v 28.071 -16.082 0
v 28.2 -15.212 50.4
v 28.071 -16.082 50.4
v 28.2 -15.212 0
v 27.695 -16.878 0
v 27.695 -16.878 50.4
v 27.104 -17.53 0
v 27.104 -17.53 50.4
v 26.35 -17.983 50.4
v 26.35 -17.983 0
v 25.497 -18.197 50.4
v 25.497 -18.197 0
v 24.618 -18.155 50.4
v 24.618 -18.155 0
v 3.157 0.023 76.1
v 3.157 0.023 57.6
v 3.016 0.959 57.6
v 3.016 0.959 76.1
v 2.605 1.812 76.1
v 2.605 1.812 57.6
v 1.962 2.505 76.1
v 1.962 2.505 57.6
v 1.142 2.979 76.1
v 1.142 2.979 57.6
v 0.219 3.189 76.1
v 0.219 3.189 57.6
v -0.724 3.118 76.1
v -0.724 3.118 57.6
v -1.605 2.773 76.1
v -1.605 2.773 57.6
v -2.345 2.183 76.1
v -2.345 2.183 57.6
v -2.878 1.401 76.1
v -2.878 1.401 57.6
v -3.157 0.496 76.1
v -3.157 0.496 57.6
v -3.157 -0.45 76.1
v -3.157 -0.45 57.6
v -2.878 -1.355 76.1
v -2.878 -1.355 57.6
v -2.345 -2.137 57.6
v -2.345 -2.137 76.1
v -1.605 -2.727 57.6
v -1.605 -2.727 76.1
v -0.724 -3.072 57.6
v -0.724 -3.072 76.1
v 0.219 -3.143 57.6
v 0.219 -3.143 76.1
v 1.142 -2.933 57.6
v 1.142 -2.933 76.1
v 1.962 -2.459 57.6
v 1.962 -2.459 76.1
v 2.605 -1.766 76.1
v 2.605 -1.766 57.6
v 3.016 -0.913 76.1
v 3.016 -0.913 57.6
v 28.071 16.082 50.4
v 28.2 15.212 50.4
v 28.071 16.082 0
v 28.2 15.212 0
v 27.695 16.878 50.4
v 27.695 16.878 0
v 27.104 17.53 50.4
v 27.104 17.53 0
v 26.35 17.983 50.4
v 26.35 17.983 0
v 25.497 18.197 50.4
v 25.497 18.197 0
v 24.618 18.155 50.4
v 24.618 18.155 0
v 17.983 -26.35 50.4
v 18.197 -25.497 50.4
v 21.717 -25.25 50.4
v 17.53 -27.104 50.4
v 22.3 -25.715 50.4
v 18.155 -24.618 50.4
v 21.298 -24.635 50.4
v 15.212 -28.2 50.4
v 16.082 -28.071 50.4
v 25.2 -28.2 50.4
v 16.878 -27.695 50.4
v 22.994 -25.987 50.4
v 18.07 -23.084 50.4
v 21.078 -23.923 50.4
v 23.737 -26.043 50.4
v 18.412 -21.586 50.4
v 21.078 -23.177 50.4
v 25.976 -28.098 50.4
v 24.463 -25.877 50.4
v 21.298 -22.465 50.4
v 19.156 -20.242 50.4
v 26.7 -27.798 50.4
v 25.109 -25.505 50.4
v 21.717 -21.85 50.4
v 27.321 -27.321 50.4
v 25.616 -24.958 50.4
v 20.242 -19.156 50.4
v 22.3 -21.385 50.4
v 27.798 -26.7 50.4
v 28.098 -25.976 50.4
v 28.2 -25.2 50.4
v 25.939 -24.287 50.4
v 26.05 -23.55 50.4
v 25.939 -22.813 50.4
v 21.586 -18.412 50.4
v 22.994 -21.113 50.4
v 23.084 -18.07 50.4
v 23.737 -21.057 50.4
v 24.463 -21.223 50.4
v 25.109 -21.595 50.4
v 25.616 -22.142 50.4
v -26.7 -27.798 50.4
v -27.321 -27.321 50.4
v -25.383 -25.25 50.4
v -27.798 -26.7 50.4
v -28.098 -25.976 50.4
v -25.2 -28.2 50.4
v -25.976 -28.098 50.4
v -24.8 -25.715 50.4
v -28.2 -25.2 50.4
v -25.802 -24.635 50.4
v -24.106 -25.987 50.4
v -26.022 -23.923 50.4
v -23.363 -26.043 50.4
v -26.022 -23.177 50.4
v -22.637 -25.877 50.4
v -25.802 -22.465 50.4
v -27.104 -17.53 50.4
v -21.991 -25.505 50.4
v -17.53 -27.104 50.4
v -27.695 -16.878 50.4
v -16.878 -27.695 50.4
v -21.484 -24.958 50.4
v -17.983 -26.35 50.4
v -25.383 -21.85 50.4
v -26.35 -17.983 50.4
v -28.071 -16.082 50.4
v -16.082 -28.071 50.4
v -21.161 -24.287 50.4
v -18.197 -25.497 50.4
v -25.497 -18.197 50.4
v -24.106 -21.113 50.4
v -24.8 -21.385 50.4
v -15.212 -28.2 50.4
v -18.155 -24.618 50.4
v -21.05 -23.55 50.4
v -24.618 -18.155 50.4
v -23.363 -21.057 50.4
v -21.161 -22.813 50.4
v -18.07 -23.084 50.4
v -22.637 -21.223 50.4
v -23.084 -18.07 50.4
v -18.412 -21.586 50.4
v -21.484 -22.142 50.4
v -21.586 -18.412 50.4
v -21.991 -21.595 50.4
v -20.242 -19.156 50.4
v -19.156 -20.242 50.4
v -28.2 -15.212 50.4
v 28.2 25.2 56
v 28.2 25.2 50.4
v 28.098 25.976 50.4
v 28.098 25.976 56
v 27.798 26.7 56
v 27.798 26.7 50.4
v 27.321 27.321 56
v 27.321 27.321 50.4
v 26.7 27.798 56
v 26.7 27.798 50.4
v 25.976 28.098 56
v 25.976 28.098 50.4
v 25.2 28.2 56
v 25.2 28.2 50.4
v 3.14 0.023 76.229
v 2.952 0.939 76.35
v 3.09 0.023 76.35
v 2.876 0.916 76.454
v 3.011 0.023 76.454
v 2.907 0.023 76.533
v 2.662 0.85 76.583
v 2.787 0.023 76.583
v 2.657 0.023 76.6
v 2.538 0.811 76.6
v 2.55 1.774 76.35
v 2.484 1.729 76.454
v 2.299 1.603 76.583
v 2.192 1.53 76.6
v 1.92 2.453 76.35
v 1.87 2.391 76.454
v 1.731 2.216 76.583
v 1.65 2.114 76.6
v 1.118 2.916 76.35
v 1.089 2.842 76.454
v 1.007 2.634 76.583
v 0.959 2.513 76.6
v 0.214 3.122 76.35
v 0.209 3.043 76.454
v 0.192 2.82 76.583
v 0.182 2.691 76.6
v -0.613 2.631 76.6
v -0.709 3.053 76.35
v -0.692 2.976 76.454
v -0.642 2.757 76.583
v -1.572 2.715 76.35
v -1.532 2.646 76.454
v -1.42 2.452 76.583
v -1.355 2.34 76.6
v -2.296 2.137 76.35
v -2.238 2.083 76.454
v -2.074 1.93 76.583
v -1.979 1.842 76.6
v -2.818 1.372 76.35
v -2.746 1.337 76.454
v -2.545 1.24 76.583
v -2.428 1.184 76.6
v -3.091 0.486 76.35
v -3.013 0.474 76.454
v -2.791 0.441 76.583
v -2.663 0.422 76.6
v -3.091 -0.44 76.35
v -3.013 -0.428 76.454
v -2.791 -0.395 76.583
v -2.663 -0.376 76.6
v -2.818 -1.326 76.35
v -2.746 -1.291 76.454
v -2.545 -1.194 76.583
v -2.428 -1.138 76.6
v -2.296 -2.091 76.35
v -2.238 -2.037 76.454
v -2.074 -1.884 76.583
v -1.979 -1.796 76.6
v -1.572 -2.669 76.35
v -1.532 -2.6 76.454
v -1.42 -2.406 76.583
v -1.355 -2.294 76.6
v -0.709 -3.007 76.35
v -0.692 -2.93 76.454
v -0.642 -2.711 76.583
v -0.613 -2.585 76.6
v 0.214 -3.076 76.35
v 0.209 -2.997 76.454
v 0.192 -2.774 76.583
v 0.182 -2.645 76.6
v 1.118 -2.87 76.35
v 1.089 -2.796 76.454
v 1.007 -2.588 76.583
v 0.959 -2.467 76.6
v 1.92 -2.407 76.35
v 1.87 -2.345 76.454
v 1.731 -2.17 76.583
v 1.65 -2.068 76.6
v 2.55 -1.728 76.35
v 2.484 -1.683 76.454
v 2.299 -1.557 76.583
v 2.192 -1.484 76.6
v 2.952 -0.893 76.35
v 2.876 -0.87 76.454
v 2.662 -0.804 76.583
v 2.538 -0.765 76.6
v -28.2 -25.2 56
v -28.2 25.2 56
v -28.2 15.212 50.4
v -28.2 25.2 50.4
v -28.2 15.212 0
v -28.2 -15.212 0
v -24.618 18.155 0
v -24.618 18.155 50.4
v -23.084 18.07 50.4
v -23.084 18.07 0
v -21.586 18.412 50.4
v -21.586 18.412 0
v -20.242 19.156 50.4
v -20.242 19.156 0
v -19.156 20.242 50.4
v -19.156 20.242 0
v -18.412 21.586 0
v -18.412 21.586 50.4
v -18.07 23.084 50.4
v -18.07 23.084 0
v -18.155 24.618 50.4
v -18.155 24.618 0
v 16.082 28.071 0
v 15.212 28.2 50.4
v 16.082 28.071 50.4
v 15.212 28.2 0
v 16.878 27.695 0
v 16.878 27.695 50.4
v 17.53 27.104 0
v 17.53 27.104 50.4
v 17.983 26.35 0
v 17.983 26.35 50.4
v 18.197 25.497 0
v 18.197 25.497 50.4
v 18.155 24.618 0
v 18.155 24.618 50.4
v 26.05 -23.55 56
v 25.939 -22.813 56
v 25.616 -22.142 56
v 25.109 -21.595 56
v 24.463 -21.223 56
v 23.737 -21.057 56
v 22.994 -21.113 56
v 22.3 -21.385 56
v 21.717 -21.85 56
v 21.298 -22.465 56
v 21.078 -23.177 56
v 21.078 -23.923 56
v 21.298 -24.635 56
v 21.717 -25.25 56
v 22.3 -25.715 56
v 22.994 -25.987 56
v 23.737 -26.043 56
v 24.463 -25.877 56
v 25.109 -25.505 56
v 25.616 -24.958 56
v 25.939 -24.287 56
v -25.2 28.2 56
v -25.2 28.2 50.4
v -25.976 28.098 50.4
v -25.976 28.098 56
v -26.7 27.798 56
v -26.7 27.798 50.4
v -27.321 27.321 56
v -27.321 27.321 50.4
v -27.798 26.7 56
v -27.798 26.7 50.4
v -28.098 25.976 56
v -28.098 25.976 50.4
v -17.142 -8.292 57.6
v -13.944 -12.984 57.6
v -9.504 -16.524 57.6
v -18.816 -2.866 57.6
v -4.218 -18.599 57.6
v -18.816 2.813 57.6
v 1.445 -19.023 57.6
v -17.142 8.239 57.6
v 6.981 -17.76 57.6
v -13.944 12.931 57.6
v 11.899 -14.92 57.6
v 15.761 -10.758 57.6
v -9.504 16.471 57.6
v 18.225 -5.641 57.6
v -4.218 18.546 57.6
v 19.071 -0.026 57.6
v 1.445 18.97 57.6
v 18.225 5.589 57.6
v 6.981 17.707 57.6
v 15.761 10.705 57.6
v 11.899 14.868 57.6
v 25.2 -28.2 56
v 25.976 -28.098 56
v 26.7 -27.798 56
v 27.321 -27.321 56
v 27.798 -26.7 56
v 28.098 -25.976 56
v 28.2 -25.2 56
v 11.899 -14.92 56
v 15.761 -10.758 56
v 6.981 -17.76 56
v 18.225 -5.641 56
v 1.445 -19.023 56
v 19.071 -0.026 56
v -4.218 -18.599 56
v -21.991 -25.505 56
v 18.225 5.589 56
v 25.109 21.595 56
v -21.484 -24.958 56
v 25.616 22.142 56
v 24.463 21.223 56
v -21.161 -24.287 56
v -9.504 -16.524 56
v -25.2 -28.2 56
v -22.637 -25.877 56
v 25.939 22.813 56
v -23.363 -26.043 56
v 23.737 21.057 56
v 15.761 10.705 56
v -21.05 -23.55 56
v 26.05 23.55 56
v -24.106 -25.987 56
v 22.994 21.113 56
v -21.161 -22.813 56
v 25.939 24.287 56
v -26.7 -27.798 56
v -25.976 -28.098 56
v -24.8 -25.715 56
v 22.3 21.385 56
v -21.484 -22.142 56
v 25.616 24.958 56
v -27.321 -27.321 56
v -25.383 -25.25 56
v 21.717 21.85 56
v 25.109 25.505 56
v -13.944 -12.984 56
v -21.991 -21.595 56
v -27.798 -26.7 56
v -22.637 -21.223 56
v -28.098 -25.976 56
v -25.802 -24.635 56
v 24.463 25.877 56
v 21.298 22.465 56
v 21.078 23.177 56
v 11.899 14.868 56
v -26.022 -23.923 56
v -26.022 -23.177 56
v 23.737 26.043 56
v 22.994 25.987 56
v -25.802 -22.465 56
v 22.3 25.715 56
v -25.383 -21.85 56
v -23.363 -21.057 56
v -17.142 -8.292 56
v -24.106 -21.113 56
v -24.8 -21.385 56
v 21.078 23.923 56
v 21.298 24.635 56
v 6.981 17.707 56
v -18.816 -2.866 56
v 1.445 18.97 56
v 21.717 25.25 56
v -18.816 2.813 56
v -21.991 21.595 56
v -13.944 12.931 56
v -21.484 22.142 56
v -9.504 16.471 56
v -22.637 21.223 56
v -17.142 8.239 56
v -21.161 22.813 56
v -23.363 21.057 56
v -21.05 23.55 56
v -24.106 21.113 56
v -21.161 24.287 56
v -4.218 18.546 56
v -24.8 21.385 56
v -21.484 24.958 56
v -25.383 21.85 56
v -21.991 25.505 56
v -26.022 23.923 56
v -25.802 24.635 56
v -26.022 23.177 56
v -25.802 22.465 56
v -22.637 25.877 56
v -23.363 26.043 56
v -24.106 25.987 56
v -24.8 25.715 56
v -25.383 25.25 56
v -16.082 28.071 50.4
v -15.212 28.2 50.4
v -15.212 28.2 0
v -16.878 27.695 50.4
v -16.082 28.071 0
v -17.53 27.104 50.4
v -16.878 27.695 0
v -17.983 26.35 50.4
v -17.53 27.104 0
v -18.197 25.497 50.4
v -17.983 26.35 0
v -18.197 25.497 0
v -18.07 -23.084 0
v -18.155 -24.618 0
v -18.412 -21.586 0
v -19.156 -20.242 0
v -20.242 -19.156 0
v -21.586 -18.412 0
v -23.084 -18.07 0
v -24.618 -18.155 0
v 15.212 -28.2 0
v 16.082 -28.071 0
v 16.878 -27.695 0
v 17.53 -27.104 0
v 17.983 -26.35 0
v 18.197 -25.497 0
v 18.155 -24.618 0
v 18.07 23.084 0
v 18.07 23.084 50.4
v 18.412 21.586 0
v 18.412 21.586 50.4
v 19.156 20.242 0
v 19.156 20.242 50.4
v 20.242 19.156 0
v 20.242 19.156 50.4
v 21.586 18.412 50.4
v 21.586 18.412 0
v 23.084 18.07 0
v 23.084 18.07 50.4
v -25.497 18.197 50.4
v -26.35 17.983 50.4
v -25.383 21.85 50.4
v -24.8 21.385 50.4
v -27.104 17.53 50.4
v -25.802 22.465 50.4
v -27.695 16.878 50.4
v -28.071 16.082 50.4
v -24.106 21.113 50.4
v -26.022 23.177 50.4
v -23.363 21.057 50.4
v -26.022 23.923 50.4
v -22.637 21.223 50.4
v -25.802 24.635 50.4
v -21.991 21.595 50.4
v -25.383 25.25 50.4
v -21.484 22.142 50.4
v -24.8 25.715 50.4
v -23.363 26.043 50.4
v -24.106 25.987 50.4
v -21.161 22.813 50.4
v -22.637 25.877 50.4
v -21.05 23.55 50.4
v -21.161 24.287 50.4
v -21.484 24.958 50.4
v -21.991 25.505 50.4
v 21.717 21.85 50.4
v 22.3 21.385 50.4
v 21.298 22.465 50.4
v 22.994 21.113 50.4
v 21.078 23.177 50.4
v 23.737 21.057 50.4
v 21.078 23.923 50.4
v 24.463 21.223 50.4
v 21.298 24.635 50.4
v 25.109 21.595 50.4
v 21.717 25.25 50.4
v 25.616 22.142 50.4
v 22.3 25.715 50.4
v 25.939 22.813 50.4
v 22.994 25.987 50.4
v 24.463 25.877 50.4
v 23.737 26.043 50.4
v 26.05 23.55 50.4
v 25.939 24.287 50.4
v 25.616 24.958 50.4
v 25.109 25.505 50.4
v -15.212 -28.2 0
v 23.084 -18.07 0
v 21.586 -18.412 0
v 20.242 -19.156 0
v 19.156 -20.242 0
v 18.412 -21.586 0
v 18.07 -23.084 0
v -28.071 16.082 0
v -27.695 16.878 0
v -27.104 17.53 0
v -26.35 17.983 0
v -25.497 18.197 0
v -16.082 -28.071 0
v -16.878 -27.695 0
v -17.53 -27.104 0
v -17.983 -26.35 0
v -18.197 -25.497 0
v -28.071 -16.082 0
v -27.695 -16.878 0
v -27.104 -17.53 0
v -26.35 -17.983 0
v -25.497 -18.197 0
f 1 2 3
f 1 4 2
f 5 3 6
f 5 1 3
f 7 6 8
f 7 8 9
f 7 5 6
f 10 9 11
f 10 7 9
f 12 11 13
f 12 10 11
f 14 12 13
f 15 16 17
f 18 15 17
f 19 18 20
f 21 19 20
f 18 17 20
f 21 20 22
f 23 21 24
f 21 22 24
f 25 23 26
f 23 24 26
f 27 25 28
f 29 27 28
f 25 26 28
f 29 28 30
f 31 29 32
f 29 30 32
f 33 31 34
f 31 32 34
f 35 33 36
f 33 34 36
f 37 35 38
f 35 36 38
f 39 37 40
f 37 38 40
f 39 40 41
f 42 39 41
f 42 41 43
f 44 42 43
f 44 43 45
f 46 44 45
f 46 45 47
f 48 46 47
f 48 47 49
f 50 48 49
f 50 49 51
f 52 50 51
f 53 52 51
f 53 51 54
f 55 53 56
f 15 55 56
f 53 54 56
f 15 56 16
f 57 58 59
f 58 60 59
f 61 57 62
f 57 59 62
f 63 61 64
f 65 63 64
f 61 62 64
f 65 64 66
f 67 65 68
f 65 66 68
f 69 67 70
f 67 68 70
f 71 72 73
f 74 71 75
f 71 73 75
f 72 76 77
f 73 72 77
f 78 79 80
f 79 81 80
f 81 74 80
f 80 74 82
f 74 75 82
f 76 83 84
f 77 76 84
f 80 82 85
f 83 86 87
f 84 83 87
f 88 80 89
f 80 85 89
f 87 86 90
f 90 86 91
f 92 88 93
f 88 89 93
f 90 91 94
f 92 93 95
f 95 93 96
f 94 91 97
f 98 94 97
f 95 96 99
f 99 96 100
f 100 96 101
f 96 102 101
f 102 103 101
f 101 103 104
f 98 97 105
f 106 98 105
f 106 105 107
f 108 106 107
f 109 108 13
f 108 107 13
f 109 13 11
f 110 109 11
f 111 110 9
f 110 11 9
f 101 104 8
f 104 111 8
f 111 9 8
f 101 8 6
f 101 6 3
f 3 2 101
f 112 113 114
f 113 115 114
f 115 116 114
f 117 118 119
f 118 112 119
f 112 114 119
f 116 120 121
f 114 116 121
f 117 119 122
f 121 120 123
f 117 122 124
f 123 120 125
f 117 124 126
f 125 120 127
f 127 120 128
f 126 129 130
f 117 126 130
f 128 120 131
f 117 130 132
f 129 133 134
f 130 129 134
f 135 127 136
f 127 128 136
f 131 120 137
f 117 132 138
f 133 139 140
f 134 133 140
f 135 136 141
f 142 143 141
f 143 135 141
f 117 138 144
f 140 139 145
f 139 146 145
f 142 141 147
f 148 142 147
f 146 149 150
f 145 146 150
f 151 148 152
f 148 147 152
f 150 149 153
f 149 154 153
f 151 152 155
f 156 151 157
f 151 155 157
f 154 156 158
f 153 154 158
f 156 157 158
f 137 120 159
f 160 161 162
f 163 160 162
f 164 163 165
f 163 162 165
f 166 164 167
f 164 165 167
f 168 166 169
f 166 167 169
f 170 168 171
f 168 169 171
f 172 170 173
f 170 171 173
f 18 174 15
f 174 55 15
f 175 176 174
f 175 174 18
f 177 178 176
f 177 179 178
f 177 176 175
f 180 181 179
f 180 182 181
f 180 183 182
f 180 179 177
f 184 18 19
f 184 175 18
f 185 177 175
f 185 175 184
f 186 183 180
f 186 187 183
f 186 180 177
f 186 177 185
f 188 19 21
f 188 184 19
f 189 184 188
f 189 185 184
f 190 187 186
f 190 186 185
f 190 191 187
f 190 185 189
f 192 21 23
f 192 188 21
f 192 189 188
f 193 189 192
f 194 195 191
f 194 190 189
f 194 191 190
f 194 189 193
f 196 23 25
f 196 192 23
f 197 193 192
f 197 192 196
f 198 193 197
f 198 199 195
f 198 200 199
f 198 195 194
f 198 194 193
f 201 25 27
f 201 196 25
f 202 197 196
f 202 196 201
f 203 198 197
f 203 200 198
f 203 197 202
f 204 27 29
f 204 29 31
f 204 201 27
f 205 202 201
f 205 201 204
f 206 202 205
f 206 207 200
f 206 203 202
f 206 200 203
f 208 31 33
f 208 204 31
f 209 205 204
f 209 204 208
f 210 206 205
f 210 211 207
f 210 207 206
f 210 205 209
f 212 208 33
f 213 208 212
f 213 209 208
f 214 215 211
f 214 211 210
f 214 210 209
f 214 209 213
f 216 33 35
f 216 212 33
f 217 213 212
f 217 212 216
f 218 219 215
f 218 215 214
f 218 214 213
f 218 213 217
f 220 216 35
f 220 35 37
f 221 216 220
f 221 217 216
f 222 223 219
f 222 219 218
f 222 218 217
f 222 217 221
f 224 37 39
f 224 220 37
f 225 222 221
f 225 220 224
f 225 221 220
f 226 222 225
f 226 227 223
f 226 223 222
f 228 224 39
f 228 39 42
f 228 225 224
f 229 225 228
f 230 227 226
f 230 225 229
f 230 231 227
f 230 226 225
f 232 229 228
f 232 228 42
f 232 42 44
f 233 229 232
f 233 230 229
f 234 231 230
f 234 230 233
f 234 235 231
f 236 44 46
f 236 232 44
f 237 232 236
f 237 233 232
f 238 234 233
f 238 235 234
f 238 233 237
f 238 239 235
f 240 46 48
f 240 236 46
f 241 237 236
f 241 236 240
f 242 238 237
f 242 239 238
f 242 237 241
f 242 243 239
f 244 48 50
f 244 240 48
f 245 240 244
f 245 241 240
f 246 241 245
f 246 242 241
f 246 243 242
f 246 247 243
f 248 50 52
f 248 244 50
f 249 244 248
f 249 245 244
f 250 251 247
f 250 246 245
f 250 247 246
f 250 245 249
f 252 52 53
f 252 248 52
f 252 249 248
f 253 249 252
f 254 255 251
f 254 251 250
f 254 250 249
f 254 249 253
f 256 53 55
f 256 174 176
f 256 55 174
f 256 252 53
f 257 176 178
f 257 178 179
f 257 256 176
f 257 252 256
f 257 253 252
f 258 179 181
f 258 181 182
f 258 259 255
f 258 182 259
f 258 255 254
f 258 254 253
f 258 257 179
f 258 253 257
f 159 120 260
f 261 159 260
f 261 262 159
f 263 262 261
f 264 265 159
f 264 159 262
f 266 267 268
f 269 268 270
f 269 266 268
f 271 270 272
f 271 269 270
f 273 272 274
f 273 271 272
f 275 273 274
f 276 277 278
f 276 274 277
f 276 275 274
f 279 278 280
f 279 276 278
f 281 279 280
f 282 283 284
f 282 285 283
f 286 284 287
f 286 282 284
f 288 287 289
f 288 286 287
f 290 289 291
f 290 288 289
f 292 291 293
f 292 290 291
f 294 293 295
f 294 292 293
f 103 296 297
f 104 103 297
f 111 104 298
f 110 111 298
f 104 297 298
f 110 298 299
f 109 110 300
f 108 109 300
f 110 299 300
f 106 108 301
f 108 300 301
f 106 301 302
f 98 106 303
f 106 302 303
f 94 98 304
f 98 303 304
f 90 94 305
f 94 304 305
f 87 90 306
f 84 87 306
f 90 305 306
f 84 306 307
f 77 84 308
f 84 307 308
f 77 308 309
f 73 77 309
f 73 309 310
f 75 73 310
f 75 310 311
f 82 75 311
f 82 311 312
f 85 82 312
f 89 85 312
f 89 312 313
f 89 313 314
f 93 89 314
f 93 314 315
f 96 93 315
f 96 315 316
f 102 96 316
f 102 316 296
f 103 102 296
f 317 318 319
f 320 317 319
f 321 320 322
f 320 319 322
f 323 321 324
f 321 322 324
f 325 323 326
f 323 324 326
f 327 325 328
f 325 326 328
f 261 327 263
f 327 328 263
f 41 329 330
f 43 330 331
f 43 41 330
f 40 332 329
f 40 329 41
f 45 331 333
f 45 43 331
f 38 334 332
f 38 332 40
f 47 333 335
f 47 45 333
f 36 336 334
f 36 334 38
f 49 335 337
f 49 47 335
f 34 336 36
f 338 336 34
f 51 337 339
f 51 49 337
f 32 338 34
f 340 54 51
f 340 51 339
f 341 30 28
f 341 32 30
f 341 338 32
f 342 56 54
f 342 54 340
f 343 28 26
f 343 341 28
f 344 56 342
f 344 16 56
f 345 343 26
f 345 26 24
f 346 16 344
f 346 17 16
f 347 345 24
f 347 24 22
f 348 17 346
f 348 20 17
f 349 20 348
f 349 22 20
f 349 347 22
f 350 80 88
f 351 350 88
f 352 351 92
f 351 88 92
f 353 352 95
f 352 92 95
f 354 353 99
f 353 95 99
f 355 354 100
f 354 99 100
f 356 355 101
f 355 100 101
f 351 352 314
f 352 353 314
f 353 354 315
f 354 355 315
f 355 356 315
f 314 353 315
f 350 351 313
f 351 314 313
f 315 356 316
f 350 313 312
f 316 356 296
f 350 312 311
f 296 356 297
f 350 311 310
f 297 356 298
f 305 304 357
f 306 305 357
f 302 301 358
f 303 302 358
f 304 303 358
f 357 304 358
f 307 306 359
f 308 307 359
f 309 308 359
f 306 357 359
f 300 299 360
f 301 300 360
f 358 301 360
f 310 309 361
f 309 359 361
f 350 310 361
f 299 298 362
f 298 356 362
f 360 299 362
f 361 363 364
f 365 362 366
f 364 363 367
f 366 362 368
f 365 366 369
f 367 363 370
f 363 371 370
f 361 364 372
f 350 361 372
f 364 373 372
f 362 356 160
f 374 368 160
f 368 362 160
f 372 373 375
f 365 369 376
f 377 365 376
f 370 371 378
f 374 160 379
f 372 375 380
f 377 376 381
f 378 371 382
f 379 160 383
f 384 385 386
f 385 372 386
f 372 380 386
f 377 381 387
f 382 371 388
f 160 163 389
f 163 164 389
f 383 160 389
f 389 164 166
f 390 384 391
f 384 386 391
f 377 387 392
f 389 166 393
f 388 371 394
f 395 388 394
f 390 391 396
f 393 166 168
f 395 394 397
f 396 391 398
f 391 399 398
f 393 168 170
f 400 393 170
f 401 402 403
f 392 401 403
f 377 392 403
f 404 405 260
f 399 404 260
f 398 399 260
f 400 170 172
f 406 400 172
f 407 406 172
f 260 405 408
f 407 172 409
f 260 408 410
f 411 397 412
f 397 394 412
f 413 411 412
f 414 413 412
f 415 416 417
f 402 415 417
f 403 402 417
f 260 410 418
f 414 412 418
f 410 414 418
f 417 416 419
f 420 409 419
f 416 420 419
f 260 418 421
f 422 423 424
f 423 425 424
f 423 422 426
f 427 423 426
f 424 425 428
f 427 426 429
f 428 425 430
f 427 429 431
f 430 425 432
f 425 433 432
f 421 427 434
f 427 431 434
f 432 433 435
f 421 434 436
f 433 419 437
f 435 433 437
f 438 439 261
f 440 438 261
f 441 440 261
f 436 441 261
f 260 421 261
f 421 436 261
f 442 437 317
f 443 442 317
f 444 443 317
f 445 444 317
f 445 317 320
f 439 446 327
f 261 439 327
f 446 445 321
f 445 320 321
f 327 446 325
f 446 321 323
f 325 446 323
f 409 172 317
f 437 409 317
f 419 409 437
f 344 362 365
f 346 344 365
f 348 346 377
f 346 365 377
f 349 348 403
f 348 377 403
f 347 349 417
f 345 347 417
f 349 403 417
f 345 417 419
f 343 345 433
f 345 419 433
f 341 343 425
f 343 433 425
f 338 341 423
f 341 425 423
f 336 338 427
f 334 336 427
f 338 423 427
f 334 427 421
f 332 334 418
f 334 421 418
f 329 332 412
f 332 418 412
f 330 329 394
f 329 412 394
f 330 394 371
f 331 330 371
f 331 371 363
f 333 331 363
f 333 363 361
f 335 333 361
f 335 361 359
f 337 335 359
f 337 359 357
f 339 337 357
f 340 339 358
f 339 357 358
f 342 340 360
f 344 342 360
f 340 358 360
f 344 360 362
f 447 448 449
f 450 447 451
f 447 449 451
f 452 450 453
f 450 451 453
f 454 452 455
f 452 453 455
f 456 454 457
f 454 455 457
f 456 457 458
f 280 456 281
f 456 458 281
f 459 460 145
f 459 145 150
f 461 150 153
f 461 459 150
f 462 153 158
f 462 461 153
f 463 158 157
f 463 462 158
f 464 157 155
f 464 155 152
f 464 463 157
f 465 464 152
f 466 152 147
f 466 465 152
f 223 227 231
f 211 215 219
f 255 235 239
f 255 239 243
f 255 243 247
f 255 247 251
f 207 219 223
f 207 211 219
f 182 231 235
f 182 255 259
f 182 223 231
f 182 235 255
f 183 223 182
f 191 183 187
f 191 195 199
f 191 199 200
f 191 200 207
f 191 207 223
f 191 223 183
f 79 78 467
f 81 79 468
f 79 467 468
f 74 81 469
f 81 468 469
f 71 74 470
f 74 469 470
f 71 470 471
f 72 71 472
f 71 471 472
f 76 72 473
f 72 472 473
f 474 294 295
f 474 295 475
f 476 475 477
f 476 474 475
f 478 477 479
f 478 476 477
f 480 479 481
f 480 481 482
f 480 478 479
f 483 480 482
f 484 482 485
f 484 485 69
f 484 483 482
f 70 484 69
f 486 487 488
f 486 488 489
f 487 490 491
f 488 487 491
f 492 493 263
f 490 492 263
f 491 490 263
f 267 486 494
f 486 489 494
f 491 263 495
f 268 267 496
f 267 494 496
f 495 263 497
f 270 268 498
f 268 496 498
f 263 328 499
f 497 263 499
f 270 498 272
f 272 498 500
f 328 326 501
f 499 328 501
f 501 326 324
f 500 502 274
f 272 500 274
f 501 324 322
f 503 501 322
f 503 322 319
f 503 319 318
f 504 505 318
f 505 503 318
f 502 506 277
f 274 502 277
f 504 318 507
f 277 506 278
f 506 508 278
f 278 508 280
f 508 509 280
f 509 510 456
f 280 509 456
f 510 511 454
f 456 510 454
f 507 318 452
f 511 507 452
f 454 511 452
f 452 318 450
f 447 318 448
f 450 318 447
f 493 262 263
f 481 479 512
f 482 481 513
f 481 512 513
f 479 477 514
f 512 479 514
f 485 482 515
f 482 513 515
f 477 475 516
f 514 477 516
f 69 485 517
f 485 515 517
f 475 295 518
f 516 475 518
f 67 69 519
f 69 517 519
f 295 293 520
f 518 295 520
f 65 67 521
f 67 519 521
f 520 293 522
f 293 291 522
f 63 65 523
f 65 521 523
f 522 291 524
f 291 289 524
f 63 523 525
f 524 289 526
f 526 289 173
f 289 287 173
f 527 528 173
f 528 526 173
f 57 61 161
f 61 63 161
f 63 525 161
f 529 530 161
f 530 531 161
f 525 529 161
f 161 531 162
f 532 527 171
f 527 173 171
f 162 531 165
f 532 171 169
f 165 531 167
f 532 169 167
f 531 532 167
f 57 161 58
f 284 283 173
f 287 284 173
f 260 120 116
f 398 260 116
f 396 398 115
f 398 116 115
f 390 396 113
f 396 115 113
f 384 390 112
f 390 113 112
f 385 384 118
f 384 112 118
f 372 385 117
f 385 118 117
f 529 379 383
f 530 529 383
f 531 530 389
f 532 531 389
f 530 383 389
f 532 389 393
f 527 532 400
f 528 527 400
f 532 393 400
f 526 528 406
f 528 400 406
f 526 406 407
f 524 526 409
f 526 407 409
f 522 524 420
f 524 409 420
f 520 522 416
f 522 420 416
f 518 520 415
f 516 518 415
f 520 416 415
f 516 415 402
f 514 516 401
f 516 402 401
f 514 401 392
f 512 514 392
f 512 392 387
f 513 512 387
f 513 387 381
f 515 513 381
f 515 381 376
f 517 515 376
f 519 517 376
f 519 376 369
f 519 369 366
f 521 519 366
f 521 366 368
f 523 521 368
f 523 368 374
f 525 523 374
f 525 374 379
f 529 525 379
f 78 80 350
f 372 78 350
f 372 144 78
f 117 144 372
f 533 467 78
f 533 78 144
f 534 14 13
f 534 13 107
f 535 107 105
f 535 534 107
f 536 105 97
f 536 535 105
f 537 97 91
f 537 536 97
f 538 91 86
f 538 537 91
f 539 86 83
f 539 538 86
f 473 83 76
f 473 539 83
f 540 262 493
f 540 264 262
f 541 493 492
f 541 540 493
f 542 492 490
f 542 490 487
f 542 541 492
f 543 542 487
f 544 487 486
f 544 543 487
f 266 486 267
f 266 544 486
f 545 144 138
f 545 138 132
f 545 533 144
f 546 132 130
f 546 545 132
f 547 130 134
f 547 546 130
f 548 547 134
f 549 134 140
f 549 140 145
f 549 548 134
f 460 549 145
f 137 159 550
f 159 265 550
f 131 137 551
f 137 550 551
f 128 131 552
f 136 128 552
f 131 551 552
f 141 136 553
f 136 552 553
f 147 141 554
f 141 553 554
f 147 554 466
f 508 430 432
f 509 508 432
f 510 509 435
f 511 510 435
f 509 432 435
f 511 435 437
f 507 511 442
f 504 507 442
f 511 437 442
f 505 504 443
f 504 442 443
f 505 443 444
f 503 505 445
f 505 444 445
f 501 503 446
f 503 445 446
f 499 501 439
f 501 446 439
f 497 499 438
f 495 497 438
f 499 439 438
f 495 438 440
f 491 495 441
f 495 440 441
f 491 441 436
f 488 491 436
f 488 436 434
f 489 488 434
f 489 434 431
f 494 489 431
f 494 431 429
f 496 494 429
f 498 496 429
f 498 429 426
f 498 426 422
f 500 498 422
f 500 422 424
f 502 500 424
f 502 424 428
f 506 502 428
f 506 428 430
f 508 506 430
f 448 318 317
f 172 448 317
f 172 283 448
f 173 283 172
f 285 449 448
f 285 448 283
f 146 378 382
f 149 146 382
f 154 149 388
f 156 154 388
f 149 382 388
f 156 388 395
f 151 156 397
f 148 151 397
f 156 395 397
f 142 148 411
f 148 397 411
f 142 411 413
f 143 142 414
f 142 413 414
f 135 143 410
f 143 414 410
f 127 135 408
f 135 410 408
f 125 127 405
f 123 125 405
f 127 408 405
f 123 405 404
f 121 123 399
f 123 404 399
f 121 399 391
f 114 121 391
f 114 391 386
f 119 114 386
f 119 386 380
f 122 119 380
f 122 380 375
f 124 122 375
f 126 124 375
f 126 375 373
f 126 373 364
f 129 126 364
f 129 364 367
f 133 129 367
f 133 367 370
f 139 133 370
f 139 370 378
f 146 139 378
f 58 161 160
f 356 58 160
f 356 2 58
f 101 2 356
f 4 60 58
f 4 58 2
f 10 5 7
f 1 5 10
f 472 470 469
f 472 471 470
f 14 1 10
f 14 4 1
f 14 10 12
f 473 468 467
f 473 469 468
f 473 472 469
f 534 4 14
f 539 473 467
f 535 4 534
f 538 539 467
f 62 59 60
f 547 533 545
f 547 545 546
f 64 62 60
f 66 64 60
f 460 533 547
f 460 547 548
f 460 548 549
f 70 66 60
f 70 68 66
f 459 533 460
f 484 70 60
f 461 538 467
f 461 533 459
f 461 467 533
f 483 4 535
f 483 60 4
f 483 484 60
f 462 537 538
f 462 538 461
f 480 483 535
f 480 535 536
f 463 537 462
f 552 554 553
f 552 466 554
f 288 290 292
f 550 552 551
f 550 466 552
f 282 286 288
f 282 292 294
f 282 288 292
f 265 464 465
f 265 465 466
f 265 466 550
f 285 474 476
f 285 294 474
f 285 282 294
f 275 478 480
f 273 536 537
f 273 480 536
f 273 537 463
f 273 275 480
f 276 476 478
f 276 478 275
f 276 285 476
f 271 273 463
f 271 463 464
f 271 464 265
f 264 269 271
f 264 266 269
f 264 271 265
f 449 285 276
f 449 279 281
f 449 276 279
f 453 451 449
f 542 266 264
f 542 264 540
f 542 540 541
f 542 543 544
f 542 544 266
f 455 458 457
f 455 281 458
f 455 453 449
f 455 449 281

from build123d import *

# Parameters (mm, degrees)
SKETCH003_R  = 5.5
PAD001_DEPTH = 51.4
PAD_DEPTH    = 56
SKETCH002_R  = 2.5
POCKET_DEPTH = 6
FILLET_R     = 3
SKETCH004_R  = 19.05
PAD002_DEPTH = 1.6
SKETCH005_R  = 3.175
PAD003_DEPTH = 19
FILLET001_R  = 0.5


with BuildPart() as pad001:
    # Sketch003 → Pad001 (new body)
    with BuildSketch(Plane.XY.offset(-1)):
        with Locations((-23.55, 23.55)):
            Circle(SKETCH003_R)
        with Locations((-23.55, -23.55)):
            Circle(SKETCH003_R)
        with Locations((23.55, 23.55)):
            Circle(SKETCH003_R)
        with Locations((23.55, -23.55)):
            Circle(SKETCH003_R)
    extrude(amount=PAD001_DEPTH)


with BuildPart() as fillet001:
    # Sketch → Pad (new body)
    with BuildSketch(Plane.XY):
        with BuildLine():
            Line((-25.2, 28.2), (25.2, 28.2))
            ThreePointArc((28.2, 25.2), (27.32132, 27.32132), (25.2, 28.2))
            Line((28.2, 25.2), (28.2, -25.2))
            ThreePointArc((25.2, -28.2), (27.32132, -27.32132), (28.2, -25.2))
            Line((25.2, -28.2), (-25.2, -28.2))
            ThreePointArc((-28.2, -25.2), (-27.32132, -27.32132), (-25.2, -28.2))
            Line((-28.2, -25.2), (-28.2, 25.2))
            ThreePointArc((-25.2, 28.2), (-27.32132, 27.32132), (-28.2, 25.2))
        make_face()
    extrude(amount=PAD_DEPTH)

    # Sketch002 → Pocket (cut)
    with BuildSketch(Plane.XY.offset(56)):
        with Locations((-23.55, 23.55)):
            Circle(SKETCH002_R)
        with Locations((-23.55, -23.55)):
            Circle(SKETCH002_R)
        with Locations((23.55, 23.55)):
            Circle(SKETCH002_R)
        with Locations((23.55, -23.55)):
            Circle(SKETCH002_R)
    extrude(amount=-POCKET_DEPTH, mode=Mode.SUBTRACT)

    # Cut: cut Pad001
    add(pad001.part, mode=Mode.SUBTRACT)

    # Fillet
    fillet_edges = [fillet001.edges().sort_by_distance(p)[0] for p in [
        (-20.612739, -28.2, 25.2),
        (-28.2, -20.612739, 25.2),
        (-28.2, 20.612739, 25.2),
        (-20.612739, 28.2, 25.2),
        (20.612739, 28.2, 25.2),
        (28.2, 20.612739, 25.2),
        (28.2, -20.612739, 25.2),
        (20.612739, -28.2, 25.2),
    ]]
    fillet(fillet_edges, radius=FILLET_R)

    # Sketch004 → Pad002 (new body)
    with BuildSketch(Plane.XY.offset(56)):
        with Locations((0.021046, -0.026368)):
            Circle(SKETCH004_R)
    extrude(amount=PAD002_DEPTH)

    # Sketch005 → Pad003 (new body)
    with BuildSketch(Plane.XY.offset(57.6)):
        with Locations((-0.017815, 0.022992)):
            Circle(SKETCH005_R)
    extrude(amount=PAD003_DEPTH)

    # Fillet001
    fillet001_edges = [fillet001.edges().sort_by_distance(p)[0] for p in [
        (-3.192815, 0.022992, 76.6),
    ]]
    fillet(fillet001_edges, radius=FILLET001_R)


solid = fillet001.part
